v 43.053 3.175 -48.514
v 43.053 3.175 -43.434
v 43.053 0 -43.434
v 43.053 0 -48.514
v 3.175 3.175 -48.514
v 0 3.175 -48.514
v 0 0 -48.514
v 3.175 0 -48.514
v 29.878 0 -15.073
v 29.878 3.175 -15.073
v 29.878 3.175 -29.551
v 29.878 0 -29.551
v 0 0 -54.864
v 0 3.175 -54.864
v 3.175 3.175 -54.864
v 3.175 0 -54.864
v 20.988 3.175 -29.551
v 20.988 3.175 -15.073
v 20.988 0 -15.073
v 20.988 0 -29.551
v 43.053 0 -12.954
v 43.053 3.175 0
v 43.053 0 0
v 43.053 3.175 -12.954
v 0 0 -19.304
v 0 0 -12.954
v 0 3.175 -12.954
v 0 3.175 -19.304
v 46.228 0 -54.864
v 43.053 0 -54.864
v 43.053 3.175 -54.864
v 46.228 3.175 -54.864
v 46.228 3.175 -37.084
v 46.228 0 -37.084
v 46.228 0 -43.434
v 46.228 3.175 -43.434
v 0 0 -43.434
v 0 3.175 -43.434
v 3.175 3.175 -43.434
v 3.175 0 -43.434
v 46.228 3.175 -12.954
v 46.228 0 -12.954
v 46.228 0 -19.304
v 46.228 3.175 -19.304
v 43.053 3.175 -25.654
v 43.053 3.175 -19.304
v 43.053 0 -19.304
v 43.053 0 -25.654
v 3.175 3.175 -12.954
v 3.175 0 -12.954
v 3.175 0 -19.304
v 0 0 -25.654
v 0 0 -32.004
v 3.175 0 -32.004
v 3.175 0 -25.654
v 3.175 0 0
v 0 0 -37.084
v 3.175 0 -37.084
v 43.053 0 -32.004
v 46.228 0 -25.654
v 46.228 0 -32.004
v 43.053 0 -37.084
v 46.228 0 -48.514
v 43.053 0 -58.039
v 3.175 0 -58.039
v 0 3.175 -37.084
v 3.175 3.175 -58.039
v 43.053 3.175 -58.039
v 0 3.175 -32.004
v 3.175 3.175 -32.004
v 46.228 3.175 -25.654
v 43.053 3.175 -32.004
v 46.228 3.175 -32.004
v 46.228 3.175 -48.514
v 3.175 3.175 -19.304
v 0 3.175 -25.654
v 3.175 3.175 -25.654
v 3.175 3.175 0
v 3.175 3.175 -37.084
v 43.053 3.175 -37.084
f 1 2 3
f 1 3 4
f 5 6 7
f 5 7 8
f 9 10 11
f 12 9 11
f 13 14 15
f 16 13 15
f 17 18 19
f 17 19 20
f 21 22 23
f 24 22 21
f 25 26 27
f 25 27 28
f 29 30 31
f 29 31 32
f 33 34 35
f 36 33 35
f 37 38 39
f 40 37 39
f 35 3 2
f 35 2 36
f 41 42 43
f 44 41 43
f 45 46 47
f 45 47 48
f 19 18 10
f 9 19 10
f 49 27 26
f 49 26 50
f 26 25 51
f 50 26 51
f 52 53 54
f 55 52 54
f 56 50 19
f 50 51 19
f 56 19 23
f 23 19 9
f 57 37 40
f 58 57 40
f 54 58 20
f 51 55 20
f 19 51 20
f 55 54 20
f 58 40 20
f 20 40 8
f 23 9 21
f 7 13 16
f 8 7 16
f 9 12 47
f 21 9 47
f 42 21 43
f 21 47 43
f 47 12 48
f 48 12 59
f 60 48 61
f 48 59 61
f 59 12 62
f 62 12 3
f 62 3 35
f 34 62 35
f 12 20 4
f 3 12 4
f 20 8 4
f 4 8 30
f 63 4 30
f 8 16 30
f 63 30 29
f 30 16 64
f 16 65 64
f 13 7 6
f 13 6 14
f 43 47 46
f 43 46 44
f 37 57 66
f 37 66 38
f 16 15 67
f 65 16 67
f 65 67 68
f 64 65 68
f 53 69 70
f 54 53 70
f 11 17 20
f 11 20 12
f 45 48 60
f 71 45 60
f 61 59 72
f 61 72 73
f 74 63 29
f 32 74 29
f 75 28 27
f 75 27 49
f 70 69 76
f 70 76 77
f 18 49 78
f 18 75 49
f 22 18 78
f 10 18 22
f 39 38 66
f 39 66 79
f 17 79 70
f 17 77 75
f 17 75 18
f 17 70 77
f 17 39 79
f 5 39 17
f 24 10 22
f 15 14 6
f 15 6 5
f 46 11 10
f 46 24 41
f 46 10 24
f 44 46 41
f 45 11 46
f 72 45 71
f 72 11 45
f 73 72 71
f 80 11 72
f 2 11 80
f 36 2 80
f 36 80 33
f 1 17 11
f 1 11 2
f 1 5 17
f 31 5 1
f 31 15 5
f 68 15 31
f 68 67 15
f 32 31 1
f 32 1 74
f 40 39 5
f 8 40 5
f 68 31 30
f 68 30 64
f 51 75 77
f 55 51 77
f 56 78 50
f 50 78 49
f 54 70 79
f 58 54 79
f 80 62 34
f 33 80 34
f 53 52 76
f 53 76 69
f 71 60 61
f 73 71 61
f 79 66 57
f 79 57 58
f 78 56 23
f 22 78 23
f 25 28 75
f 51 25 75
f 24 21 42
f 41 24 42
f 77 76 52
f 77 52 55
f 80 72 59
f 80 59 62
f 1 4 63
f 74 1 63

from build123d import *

# Parameters (mm, degrees)
SKETCH1_W           = 46.228
SKETCH1_H           = 62.484
BOSS_EXTRUDE1_DEPTH = 3.175
SKETCH4_W           = 3.175
SKETCH4_H           = 12.954
SKETCH4_H_2         = 5.08
SKETCH4_H_3         = 7.62
SKETCH4_H_4         = 6.35
SKETCH4_W_2         = 8.89
SKETCH4_H_5         = 14.478
CUT_EXTRUDE2_DEPTH  = 4.064
SKETCH5_W           = 39.878
SKETCH5_H           = 4.445
CUT_EXTRUDE3_DEPTH  = 4.064


with BuildPart() as part:
    # Sketch1 → Boss-Extrude1 (new body)
    with BuildSketch(Plane(origin=(0, 0, 0), x_dir=(1, 0, 0), z_dir=(0, 1, 0))):
        with Locations((23.114, 31.242)):
            Rectangle(SKETCH1_W, SKETCH1_H)
    extrude(amount=BOSS_EXTRUDE1_DEPTH)

    # Sketch4 → Cut-Extrude2 (cut)
    with BuildSketch(Plane(origin=(0, 3.175, 0), x_dir=(1, 0, 0), z_dir=(0, 1, 0))):
        with Locations((44.6405, 6.477)):
            Rectangle(SKETCH4_W, SKETCH4_H)
        with Locations((44.6405, 34.544)):
            Rectangle(SKETCH4_W, SKETCH4_H_2)
        with Locations((44.6405, 45.974)):
            Rectangle(SKETCH4_W, SKETCH4_H_2)
        with Locations((44.6405, 58.674)):
            Rectangle(SKETCH4_W, SKETCH4_H_3)
        with Locations((44.6405, 22.479)):
            Rectangle(SKETCH4_W, SKETCH4_H_4)
        with Locations((1.5875, 6.477)):
            Rectangle(SKETCH4_W, SKETCH4_H)
        with Locations((1.5875, 22.479)):
            Rectangle(SKETCH4_W, SKETCH4_H_4)
        with Locations((1.5875, 34.544)):
            Rectangle(SKETCH4_W, SKETCH4_H_2)
        with Locations((1.5875, 45.974)):
            Rectangle(SKETCH4_W, SKETCH4_H_2)
        with Locations((1.5875, 58.674)):
            Rectangle(SKETCH4_W, SKETCH4_H_3)
        with Locations((25.433226228, 22.312235855)):
            Rectangle(SKETCH4_W_2, SKETCH4_H_5)
    extrude(amount=-CUT_EXTRUDE2_DEPTH, mode=Mode.SUBTRACT)

    # Sketch5 → Cut-Extrude3 (cut)
    with BuildSketch(Plane(origin=(0, 3.175, 0), x_dir=(1, 0, 0), z_dir=(0, 1, 0))):
        with Locations((23.114, 60.2615)):
            Rectangle(SKETCH5_W, SKETCH5_H)
    extrude(amount=-CUT_EXTRUDE3_DEPTH, mode=Mode.SUBTRACT)


solid = part.part
